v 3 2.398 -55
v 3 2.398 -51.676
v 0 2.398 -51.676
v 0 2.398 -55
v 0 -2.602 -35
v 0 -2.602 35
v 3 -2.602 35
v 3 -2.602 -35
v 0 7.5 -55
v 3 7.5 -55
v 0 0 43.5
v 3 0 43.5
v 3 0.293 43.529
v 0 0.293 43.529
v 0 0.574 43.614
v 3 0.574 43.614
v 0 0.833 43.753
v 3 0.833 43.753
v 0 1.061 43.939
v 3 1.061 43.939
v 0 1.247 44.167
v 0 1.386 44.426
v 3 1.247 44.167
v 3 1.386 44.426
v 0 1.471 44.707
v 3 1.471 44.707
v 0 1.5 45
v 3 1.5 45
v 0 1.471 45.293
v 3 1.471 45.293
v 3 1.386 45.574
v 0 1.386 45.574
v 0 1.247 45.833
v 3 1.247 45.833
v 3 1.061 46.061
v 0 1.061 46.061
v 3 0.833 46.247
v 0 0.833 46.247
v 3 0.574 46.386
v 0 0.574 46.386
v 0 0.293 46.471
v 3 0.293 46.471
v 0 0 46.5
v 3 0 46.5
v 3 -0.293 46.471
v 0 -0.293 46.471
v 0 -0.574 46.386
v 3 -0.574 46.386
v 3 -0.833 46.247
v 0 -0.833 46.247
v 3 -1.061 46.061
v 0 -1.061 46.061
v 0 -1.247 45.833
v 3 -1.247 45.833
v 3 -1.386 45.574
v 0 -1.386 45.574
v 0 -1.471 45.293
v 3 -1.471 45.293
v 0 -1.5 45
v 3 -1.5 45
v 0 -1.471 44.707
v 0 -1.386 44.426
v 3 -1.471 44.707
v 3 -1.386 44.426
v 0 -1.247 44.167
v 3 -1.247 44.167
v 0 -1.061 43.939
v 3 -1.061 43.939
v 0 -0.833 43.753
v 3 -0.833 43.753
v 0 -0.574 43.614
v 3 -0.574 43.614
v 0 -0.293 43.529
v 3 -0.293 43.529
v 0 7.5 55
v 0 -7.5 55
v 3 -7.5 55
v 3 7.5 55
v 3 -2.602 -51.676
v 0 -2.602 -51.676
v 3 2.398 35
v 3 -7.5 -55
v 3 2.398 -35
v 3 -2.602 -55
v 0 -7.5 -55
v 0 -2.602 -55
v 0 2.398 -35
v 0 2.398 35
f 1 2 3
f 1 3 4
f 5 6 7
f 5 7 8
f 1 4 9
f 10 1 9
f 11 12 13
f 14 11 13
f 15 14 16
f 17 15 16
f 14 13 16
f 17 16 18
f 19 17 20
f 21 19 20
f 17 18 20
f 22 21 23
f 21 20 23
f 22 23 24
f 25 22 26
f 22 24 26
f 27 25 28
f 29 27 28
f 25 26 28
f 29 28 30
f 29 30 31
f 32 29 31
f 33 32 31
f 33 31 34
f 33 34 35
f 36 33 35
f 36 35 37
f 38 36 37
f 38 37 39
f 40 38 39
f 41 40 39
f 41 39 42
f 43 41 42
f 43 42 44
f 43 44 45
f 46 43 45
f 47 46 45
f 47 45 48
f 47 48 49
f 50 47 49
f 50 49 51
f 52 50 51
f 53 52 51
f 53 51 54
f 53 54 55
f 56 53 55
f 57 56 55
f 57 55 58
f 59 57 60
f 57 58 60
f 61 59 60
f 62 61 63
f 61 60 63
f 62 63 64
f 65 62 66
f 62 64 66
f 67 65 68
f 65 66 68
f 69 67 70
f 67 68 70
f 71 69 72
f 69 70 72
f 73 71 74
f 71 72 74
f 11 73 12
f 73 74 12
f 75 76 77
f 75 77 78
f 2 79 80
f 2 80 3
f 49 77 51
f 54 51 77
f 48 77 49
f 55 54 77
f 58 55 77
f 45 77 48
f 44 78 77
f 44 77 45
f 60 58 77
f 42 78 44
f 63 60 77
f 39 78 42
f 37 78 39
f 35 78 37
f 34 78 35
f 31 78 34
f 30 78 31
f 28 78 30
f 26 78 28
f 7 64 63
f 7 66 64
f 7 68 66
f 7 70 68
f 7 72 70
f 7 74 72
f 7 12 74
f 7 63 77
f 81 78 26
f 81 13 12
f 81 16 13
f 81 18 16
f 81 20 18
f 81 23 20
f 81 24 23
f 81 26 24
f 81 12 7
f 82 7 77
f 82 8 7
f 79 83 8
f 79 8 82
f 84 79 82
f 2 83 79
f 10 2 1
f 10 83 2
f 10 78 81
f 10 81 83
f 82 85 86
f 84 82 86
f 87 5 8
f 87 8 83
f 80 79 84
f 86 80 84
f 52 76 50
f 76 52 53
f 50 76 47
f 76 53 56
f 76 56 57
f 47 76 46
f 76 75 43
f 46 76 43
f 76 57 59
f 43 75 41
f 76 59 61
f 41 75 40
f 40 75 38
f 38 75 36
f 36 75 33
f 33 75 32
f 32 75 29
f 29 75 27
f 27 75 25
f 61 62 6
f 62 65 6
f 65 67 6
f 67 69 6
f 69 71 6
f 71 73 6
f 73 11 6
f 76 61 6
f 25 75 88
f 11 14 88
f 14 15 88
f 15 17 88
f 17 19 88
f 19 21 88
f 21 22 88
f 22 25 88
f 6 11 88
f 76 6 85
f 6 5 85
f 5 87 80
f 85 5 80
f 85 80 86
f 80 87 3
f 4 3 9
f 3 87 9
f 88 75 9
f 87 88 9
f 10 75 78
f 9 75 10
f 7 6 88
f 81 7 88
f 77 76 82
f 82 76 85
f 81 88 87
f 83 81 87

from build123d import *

# Parameters (mm, degrees)
SKETCH1_W           = 110
SKETCH1_H           = 15
SKETCH1_W_2         = 70
SKETCH1_H_2         = 5
BOSS_EXTRUDE1_DEPTH = 3
SKETCH2_R           = 1.5
SKETCH2_W           = 3.323826254
SKETCH2_H           = 5
CUT_EXTRUDE1_DEPTH  = 56.590017089


with BuildPart() as part:
    # Sketch1 → Boss-Extrude1 (new body)
    with BuildSketch(Plane(origin=(0, 0, 0), x_dir=(0, 0, -1), z_dir=(1, 0, 0))):
        Rectangle(SKETCH1_W, SKETCH1_H)
        with Locations((0, -0.10154628)):
            Rectangle(SKETCH1_W_2, SKETCH1_H_2, mode=Mode.SUBTRACT)
    extrude(amount=BOSS_EXTRUDE1_DEPTH)

    # Sketch2 → Cut-Extrude1 (cut, through all)
    with BuildSketch(Plane(origin=(3, 0, 0), x_dir=(0, 0, -1), z_dir=(1, 0, 0))):
        with Locations((-45, 0)):
            Circle(SKETCH2_R)
        with Locations((53.338086873, -0.10154628)):
            Rectangle(SKETCH2_W, SKETCH2_H)
    extrude(amount=-CUT_EXTRUDE1_DEPTH, mode=Mode.SUBTRACT)


solid = part.part
